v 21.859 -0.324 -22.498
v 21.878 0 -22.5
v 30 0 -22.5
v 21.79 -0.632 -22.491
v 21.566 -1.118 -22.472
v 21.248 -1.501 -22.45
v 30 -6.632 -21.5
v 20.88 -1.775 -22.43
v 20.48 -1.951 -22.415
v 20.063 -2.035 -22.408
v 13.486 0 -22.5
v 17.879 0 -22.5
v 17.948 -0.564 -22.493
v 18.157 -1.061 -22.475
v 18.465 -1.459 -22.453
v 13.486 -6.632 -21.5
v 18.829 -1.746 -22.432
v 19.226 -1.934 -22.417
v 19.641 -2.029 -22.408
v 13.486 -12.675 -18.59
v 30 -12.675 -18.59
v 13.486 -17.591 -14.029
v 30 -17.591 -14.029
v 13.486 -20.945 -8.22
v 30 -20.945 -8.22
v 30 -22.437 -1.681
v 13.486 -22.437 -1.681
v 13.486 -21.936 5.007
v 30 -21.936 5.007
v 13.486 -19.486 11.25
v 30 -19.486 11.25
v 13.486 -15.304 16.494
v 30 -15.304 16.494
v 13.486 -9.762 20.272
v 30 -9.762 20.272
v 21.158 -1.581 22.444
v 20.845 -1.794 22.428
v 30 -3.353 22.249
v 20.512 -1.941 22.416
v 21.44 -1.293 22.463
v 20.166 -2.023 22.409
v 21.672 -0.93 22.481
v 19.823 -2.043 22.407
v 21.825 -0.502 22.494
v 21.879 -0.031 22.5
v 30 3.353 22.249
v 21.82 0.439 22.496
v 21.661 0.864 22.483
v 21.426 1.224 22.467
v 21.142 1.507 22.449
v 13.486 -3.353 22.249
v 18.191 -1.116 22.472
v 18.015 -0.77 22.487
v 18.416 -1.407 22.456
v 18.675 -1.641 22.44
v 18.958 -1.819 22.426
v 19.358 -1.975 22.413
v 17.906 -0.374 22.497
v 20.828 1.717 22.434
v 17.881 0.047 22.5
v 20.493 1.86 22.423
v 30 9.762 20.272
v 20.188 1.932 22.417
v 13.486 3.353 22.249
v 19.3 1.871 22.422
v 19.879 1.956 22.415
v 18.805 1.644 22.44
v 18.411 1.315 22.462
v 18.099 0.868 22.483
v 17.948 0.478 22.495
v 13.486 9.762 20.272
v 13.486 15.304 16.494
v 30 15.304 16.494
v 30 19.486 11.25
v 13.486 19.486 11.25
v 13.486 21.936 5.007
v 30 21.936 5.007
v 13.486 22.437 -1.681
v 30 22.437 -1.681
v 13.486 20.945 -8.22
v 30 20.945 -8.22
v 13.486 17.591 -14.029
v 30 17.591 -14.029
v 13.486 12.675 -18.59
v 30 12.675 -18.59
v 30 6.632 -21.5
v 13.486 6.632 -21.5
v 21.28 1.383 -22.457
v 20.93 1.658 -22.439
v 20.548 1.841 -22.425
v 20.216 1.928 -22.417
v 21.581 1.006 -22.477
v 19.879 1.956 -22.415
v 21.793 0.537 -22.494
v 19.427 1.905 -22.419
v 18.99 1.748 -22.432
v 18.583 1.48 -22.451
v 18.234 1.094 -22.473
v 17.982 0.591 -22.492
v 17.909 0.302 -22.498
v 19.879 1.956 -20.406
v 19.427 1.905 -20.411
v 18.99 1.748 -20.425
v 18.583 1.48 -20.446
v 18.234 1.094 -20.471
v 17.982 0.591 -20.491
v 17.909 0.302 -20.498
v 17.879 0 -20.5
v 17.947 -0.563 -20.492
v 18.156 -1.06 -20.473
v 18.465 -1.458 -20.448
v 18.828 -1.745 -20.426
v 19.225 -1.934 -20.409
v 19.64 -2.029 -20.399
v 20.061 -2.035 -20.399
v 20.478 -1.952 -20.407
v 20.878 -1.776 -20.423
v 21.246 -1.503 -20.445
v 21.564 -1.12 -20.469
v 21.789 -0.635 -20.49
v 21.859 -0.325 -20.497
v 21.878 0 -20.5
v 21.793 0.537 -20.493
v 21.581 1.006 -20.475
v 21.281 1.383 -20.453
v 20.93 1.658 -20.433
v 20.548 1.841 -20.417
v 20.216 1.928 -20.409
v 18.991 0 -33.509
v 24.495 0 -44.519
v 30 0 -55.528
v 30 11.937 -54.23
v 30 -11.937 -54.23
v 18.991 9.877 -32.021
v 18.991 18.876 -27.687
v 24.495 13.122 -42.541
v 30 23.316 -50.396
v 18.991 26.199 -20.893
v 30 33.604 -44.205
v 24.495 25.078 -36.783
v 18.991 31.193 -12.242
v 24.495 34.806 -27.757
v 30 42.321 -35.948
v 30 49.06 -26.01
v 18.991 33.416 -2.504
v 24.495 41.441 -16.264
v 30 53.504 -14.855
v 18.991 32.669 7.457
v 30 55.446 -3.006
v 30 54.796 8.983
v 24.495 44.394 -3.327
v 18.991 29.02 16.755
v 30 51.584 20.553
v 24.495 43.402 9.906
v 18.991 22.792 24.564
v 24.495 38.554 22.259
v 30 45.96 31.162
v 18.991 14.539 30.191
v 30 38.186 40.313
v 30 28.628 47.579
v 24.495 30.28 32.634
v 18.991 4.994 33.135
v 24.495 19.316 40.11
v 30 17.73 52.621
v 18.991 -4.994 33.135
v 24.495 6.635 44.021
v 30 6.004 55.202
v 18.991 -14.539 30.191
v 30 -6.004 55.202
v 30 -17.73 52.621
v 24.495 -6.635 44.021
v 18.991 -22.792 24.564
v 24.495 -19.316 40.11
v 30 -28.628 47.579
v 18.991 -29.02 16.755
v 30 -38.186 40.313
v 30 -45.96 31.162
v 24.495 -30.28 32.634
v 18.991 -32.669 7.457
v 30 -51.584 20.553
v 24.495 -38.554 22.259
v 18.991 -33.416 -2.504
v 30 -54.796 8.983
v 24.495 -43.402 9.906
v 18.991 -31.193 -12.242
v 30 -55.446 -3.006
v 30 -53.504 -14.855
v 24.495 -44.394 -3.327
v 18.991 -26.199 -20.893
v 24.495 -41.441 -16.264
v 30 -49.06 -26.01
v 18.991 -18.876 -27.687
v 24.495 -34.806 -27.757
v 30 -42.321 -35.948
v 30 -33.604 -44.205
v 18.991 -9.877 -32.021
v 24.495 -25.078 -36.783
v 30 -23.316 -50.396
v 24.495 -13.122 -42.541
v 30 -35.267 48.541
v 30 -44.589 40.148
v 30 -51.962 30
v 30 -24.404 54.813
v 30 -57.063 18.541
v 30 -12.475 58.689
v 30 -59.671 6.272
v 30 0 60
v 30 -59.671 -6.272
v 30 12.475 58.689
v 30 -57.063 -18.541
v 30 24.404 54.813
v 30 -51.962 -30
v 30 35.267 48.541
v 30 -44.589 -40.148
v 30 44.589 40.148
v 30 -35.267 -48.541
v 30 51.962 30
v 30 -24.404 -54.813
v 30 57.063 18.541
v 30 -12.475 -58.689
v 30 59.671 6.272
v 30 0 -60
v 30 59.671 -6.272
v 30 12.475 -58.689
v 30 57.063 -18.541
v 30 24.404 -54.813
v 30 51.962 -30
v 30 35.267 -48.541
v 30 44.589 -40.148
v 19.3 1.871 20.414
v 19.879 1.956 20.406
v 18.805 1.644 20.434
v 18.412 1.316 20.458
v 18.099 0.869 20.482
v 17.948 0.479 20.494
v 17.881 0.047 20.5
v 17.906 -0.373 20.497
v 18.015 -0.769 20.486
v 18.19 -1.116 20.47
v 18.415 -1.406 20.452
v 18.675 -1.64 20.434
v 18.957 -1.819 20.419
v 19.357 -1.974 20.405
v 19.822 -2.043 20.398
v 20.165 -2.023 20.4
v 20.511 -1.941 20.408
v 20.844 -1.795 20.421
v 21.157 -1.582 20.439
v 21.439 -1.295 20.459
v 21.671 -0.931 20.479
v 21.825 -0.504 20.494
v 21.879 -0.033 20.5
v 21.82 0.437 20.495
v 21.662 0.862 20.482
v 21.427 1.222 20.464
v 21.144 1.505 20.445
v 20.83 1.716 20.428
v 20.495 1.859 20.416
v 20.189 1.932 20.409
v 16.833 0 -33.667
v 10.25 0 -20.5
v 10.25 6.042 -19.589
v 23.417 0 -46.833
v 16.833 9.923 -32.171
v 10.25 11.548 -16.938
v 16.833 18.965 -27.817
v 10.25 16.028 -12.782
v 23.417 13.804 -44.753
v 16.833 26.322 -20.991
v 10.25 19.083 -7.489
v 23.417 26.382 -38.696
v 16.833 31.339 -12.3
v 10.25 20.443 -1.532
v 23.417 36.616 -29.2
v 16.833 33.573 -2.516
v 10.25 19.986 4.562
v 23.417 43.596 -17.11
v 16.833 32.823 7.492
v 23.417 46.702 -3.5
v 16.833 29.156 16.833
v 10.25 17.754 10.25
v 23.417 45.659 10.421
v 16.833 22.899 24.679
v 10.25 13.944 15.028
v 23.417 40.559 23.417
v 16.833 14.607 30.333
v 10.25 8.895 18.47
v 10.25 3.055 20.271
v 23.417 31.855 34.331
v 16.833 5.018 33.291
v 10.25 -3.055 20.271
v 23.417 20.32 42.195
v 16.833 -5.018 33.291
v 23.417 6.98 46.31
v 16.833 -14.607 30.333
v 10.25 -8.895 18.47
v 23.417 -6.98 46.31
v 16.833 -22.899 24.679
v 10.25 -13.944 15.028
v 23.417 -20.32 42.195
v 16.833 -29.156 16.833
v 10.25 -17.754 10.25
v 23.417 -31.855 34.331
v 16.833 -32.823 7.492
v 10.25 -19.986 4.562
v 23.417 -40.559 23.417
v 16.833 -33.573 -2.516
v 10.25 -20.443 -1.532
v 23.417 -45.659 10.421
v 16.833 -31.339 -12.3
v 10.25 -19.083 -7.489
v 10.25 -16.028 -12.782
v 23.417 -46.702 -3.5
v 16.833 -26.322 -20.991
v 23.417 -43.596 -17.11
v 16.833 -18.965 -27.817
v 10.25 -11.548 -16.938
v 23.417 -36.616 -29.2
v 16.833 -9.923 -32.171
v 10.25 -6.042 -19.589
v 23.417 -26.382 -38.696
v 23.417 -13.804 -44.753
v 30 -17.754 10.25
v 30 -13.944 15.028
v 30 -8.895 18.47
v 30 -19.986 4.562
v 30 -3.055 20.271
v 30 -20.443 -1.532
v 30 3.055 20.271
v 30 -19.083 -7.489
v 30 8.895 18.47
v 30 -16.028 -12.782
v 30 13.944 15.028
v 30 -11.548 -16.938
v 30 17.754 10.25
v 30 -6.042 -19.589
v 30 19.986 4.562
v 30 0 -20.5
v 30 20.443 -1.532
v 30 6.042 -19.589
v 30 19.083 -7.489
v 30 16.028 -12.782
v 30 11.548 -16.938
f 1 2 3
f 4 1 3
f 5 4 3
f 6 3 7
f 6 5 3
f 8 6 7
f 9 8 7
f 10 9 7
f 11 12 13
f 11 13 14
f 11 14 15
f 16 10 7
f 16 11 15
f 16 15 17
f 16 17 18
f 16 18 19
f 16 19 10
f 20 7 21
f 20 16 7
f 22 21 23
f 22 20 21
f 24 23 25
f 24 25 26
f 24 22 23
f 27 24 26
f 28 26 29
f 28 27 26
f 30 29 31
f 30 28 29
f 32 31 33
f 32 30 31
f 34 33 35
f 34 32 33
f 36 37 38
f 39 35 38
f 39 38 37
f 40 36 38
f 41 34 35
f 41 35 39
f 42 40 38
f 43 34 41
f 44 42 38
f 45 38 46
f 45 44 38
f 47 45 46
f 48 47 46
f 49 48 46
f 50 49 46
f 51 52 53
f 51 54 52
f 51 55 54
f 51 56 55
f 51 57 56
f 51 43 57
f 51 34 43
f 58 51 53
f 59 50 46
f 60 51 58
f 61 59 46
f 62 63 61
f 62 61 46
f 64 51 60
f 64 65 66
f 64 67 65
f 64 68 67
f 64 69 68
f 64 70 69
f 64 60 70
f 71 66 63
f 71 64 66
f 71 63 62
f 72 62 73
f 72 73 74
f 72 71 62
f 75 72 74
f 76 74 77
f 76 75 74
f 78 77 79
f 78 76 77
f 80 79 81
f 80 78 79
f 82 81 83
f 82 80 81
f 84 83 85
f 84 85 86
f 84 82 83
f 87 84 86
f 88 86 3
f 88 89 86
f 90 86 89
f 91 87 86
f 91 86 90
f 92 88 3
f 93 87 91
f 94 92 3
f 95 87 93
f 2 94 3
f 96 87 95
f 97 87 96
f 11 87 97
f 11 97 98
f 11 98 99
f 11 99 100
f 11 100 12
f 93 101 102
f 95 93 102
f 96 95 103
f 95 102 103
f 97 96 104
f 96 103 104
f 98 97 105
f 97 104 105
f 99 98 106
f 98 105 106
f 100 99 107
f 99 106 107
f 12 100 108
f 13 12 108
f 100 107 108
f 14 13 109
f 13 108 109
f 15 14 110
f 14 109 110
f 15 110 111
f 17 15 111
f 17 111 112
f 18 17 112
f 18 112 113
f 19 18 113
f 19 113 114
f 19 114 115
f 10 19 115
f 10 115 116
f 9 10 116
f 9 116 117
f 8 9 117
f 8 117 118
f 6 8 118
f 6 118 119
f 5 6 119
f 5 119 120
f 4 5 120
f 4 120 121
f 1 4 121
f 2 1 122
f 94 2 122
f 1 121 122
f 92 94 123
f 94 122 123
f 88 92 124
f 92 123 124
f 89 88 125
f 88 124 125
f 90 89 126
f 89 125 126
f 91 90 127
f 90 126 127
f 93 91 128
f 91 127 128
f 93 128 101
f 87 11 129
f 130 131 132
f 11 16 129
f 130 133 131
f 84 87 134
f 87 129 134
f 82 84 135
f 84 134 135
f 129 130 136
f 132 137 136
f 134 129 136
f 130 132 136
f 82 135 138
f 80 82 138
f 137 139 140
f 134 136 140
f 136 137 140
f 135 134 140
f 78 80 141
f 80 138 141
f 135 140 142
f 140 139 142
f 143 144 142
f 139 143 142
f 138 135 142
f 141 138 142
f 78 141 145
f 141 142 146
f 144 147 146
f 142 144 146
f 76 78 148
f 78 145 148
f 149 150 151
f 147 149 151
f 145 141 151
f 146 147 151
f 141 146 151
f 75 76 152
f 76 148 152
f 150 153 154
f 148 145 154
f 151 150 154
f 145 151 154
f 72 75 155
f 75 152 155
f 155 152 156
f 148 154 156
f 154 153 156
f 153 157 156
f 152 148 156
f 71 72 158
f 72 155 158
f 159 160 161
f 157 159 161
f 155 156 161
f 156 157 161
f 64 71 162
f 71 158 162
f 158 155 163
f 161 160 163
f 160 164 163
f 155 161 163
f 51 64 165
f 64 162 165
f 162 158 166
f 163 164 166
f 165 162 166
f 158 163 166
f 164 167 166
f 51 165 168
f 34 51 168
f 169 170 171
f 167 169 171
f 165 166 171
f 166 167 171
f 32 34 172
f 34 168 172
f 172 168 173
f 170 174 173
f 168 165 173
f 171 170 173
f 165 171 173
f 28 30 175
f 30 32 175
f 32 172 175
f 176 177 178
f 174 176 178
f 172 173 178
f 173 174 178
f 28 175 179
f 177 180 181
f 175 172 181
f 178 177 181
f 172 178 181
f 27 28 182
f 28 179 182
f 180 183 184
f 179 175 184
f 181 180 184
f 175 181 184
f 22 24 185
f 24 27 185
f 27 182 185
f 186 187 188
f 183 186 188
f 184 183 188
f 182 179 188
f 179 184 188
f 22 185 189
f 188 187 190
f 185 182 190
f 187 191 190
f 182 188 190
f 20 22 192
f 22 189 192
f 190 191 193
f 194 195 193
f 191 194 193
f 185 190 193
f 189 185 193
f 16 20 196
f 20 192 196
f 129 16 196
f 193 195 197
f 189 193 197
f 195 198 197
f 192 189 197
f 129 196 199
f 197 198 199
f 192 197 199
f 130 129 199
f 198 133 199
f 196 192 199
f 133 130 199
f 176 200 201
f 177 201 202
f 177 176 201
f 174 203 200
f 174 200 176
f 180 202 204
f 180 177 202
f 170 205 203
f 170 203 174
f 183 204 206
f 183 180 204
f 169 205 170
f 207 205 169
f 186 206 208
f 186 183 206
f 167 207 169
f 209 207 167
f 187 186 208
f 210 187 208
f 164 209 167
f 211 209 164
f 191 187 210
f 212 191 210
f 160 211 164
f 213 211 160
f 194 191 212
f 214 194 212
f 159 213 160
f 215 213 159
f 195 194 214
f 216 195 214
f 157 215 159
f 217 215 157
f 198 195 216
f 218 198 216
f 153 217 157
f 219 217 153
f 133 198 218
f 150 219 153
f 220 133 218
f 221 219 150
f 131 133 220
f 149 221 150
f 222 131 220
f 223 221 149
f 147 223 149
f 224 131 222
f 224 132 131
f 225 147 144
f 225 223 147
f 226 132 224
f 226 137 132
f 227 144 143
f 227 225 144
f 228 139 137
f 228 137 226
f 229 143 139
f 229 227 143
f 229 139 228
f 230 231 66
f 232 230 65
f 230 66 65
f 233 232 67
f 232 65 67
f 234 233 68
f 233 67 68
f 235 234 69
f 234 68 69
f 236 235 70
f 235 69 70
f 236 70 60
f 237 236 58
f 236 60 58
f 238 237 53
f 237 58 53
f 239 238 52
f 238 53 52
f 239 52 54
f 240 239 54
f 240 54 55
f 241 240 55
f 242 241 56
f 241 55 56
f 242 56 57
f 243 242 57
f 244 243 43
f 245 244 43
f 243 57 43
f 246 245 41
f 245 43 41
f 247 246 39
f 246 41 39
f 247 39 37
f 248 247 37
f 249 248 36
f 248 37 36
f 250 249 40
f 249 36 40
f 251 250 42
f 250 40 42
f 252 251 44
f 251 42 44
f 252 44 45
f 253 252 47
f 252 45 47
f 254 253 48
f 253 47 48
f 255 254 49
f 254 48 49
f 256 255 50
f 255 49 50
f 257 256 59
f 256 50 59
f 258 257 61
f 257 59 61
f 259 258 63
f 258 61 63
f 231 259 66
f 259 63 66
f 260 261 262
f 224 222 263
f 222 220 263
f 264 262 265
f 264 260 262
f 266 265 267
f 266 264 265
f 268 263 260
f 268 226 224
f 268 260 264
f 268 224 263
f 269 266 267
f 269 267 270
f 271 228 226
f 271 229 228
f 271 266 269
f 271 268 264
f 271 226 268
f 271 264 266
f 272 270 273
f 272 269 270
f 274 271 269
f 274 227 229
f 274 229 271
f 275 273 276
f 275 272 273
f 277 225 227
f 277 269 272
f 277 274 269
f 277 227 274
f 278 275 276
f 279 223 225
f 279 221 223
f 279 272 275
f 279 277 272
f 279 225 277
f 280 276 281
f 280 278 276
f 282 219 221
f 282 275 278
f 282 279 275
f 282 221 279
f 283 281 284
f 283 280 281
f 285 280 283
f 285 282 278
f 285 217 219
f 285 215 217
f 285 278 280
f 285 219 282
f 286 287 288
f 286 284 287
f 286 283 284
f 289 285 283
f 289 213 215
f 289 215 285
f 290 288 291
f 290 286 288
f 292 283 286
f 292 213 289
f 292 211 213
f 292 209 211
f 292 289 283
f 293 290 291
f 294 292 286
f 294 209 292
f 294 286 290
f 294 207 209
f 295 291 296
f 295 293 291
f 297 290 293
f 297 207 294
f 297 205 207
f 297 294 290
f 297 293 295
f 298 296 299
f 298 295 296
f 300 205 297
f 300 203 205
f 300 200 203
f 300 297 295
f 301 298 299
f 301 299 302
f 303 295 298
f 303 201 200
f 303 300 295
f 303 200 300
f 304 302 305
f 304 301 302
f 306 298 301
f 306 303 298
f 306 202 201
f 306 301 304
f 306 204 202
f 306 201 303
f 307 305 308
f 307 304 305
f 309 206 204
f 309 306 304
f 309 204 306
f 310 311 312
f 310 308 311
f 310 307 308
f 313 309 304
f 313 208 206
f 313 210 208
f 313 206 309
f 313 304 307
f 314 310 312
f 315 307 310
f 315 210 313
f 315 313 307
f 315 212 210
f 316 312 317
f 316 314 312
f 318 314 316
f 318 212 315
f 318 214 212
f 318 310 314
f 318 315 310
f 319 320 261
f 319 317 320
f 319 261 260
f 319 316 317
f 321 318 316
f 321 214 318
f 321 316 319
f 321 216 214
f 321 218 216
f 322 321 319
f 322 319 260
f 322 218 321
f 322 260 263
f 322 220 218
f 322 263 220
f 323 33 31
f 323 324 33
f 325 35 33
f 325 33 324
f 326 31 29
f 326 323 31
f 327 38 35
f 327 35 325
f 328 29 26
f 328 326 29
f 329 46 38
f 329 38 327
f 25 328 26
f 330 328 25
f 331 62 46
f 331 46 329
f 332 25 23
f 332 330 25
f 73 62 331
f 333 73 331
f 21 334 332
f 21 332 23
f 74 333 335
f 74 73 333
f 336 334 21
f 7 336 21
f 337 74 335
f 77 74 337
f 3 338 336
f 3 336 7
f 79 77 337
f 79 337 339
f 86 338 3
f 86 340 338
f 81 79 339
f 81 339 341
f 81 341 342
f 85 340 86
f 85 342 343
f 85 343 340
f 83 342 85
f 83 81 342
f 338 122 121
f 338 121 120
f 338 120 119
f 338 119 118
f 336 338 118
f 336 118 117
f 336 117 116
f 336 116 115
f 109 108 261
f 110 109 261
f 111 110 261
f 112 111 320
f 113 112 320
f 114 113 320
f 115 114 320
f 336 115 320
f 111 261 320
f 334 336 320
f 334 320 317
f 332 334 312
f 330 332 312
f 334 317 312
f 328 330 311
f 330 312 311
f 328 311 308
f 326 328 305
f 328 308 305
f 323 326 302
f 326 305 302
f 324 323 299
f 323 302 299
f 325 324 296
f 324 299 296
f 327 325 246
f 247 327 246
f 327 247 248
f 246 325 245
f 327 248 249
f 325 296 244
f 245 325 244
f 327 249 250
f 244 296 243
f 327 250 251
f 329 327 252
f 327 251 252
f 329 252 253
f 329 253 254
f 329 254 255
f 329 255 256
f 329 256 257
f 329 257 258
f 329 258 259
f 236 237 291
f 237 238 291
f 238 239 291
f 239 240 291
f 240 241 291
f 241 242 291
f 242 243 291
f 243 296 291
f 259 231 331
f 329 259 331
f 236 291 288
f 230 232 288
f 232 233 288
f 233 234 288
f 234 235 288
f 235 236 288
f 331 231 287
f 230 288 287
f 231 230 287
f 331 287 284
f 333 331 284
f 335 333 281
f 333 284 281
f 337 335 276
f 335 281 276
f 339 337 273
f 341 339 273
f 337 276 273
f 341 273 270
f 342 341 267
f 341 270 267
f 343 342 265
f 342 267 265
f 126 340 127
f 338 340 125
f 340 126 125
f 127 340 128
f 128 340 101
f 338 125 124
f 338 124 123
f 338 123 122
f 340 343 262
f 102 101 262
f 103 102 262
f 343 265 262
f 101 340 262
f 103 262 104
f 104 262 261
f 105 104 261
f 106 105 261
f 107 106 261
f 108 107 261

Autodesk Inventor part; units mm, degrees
ref_plane "YZ Plane" through (0, 0, 0) normal (1, 0, 0) x (0, 1, 0)
ref_plane "XZ Plane" through (0, 0, 0) normal (0, 1, 0) x (-1, 0, 0)
ref_plane "XY Plane" through (0, 0, 0) normal (0, 0, 1) x (1, 0, 0)
sketch "Sketch3" plane through (0, 0, 0) normal (0, 1, 0) x (-1, 0, 0)
  line L0 (0, 0) -> (-30, 0)
  line L1 (-30, 0) -> (-30, -60)
  line L2 (-30, -60) -> (0, 0)
  dimension "d10" = 30
  dimension "d11" = 60
  dimension "d33" = 67.082
revolve "Revolution4" add sketch "Sketch3" angle 360 about axis through (0, 0, 0) along (1, 0, 0)
sketch "Sketch4" plane through (30, 0, 0) normal (1, 0, 0) x (0, 0, -1)
  point P0 (0, 0)
  point P1 (0, 0)
hole "Hole1" at (30, 0, 0) direction (-1, 0, 0) diameter 41 depth 40.25
shell "Shell2" thickness 2 removed faces 1 at (30, 15.6337, 43.9334)
sketch "Sketch5" plane through (0, 0, 0) normal (0, 0, 1) x (1, 0, 0)
  circle A0 centre (19.9279, 0) radius 1.5
  point P0 (0, 0)
  dimension "d25" = 3
extrude "Extrusion1" add sketch "Sketch5" along normal blind 21.5 and the other way blind 24
sketch "Sketch6" plane through (19.9279, 0, -24) normal (0, 0, -1) x (-1, 0, 0)
  point P0 (19.9279, 0)
  point P1 (0.0492, -0.0436)
hole "Hole2" at (19.8787, -0.0436, -24) direction (0, 0, 1) diameter 4 depth 48.25
properties part number "Penahan tanah" material "Aluminum 6061-AHC"
